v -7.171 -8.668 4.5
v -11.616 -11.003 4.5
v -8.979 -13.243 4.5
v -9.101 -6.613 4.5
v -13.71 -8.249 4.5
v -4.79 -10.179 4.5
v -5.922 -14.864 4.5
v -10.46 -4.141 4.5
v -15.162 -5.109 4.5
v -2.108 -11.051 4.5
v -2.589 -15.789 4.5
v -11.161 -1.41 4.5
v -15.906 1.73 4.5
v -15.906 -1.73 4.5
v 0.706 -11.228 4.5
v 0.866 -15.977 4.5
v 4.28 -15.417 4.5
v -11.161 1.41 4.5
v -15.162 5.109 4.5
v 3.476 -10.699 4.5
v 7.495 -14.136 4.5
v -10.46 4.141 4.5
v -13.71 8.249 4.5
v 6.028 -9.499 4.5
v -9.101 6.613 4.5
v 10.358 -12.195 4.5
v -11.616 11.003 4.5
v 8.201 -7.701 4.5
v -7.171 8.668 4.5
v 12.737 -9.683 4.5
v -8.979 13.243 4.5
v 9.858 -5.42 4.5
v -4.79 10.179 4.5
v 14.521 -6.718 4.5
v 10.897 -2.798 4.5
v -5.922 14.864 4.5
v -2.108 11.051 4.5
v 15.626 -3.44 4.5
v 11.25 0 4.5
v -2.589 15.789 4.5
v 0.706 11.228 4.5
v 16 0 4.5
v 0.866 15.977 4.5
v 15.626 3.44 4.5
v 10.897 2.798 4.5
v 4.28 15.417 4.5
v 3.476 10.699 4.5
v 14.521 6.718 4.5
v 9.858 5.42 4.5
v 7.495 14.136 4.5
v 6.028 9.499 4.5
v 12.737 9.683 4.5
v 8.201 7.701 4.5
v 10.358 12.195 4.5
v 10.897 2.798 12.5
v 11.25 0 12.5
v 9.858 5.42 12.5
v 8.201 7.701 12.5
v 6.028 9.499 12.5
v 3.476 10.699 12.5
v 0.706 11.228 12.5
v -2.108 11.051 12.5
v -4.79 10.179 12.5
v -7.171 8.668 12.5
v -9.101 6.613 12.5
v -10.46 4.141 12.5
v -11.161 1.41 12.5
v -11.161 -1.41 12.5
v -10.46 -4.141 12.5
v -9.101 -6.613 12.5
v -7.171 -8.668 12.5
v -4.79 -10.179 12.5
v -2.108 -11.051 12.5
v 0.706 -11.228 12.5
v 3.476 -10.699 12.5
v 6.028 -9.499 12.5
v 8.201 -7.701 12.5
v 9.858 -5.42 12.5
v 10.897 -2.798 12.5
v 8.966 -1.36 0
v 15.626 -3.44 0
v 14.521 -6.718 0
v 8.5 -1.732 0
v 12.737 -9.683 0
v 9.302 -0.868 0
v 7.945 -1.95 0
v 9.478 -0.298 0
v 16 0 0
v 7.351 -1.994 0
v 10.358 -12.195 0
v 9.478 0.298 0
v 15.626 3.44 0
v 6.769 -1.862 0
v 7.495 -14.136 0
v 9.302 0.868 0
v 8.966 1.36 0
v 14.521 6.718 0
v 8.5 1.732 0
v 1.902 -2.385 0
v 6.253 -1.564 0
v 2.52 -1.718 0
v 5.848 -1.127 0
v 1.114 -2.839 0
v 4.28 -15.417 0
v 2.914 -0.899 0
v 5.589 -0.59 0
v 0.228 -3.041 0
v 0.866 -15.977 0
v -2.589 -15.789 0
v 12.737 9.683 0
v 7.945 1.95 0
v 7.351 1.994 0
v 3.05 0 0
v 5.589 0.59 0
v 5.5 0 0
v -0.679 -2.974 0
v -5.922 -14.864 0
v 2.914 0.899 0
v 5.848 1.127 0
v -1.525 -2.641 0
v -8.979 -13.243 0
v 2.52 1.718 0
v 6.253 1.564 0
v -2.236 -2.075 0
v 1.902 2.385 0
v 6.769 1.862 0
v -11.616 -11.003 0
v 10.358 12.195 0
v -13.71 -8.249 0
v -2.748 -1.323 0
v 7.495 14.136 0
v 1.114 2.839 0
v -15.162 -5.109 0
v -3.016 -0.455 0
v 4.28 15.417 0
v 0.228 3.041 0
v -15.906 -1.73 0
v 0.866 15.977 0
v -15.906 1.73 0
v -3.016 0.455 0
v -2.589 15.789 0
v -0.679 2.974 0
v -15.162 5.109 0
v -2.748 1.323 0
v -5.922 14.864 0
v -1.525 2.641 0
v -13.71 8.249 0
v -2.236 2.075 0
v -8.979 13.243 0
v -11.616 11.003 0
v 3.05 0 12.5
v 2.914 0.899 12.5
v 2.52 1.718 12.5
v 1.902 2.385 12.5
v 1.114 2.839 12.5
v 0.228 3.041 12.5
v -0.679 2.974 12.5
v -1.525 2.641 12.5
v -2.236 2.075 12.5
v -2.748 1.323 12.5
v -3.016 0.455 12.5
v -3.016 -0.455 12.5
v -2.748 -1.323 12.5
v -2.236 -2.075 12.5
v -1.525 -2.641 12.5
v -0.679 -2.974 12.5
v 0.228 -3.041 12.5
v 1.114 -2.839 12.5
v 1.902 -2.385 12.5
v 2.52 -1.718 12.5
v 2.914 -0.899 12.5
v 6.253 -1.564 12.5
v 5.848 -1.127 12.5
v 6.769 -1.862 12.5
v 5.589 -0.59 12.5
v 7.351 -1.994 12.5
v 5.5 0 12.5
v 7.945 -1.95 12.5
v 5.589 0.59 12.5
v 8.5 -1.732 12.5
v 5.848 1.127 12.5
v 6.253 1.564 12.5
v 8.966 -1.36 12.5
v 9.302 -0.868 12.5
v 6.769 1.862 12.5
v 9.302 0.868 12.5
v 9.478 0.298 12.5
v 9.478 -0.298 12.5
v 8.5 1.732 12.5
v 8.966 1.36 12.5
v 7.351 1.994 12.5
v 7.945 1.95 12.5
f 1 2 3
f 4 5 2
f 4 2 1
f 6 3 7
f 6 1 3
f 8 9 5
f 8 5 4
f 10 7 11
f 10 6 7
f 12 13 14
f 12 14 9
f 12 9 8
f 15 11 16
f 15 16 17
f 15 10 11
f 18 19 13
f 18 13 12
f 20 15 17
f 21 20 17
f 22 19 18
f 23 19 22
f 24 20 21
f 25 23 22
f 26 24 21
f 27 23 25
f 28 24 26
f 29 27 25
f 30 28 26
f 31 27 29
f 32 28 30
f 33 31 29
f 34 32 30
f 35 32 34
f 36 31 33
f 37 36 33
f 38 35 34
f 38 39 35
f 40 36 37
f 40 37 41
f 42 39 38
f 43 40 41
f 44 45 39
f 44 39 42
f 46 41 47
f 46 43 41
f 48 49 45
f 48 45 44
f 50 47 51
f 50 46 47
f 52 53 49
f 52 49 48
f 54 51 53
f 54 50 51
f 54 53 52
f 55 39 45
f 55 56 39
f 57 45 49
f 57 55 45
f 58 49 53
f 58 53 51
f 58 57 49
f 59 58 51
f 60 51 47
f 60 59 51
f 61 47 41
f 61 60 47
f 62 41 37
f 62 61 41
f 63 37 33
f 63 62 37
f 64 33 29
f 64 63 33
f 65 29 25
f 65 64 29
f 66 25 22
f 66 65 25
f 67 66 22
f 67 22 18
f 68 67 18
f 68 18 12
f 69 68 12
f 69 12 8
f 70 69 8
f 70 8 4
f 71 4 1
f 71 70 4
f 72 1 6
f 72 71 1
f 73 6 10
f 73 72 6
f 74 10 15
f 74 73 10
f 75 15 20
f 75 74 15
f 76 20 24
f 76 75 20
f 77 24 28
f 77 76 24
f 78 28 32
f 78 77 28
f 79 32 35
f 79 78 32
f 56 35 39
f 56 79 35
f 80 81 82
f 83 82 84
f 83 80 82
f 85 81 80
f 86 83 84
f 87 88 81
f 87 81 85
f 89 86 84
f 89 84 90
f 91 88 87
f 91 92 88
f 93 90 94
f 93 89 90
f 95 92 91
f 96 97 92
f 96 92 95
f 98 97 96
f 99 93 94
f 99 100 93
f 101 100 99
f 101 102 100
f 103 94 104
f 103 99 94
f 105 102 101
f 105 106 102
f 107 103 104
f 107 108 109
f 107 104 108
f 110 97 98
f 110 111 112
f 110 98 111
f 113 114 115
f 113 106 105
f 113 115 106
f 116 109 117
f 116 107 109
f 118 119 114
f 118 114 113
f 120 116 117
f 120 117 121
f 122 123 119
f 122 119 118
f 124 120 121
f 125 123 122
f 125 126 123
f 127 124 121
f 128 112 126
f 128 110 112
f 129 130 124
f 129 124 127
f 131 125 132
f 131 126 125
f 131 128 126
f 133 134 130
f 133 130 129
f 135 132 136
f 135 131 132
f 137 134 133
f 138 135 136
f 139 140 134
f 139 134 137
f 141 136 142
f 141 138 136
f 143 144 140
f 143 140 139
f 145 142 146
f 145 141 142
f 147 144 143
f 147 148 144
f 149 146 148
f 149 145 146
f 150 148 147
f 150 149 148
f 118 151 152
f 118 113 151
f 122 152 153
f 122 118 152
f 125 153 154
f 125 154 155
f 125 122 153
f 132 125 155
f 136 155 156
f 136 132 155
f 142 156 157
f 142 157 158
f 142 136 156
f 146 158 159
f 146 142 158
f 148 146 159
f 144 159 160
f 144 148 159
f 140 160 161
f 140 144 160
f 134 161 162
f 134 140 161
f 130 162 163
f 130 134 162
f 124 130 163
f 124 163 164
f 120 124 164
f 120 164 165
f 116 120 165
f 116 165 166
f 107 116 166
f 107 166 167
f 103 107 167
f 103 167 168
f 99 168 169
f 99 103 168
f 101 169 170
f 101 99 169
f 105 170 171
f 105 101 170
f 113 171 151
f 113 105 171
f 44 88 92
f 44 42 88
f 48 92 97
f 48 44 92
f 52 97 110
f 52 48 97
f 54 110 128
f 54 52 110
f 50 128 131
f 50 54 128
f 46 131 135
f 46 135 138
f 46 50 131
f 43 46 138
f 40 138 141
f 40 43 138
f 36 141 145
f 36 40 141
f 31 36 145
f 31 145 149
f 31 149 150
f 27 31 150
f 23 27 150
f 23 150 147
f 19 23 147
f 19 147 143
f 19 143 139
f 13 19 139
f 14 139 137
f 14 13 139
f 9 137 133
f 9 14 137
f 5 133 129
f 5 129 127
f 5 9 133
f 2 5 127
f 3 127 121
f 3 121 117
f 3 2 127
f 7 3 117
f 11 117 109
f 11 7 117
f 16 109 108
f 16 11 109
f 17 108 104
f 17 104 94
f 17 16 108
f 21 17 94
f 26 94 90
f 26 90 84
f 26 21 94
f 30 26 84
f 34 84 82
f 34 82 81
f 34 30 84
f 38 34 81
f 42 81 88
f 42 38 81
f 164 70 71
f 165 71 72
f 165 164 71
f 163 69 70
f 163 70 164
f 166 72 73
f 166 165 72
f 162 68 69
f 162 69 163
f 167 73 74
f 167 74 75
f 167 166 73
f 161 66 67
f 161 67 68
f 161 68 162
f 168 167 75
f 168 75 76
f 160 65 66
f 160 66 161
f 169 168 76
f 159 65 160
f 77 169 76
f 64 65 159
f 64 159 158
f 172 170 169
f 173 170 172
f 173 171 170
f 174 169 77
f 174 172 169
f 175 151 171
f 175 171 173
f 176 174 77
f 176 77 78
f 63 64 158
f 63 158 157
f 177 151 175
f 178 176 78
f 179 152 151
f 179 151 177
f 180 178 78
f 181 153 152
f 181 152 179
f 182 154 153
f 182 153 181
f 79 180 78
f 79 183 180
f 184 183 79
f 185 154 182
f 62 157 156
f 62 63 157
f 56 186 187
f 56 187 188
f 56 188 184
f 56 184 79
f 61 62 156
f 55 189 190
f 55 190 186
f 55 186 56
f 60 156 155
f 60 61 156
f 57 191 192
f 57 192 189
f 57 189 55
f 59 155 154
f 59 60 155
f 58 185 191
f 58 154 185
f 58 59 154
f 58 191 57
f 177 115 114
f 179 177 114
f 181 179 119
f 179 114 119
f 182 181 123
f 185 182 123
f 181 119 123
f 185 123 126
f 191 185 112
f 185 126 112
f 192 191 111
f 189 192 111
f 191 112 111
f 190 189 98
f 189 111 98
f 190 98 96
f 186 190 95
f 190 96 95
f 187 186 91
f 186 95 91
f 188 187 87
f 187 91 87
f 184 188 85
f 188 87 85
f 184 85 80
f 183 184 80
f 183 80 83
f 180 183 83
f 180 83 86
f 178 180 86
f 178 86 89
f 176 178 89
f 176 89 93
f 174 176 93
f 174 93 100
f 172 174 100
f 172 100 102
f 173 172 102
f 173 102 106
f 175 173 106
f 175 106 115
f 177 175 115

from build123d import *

# Parameters (mm, degrees)
F3_D = 4


with BuildPart() as f1:
    # F0 (on Front) → F1 (revolve)
    with BuildSketch(Plane.XZ):
        Polygon((11.25, 12.5), (3.05, 12.5), (3.05, 0), (16, 0), (16, 4.5), (11.25, 4.5), align=None)
    revolve(axis=Axis((0, 0, 22.5), (0, 0, 1)))

    # F3 (through all)
    with Locations(Plane.XY.offset(12.5)):
        with Locations((7.5, 0)):
            Hole(F3_D / 2)


solid = f1.part
